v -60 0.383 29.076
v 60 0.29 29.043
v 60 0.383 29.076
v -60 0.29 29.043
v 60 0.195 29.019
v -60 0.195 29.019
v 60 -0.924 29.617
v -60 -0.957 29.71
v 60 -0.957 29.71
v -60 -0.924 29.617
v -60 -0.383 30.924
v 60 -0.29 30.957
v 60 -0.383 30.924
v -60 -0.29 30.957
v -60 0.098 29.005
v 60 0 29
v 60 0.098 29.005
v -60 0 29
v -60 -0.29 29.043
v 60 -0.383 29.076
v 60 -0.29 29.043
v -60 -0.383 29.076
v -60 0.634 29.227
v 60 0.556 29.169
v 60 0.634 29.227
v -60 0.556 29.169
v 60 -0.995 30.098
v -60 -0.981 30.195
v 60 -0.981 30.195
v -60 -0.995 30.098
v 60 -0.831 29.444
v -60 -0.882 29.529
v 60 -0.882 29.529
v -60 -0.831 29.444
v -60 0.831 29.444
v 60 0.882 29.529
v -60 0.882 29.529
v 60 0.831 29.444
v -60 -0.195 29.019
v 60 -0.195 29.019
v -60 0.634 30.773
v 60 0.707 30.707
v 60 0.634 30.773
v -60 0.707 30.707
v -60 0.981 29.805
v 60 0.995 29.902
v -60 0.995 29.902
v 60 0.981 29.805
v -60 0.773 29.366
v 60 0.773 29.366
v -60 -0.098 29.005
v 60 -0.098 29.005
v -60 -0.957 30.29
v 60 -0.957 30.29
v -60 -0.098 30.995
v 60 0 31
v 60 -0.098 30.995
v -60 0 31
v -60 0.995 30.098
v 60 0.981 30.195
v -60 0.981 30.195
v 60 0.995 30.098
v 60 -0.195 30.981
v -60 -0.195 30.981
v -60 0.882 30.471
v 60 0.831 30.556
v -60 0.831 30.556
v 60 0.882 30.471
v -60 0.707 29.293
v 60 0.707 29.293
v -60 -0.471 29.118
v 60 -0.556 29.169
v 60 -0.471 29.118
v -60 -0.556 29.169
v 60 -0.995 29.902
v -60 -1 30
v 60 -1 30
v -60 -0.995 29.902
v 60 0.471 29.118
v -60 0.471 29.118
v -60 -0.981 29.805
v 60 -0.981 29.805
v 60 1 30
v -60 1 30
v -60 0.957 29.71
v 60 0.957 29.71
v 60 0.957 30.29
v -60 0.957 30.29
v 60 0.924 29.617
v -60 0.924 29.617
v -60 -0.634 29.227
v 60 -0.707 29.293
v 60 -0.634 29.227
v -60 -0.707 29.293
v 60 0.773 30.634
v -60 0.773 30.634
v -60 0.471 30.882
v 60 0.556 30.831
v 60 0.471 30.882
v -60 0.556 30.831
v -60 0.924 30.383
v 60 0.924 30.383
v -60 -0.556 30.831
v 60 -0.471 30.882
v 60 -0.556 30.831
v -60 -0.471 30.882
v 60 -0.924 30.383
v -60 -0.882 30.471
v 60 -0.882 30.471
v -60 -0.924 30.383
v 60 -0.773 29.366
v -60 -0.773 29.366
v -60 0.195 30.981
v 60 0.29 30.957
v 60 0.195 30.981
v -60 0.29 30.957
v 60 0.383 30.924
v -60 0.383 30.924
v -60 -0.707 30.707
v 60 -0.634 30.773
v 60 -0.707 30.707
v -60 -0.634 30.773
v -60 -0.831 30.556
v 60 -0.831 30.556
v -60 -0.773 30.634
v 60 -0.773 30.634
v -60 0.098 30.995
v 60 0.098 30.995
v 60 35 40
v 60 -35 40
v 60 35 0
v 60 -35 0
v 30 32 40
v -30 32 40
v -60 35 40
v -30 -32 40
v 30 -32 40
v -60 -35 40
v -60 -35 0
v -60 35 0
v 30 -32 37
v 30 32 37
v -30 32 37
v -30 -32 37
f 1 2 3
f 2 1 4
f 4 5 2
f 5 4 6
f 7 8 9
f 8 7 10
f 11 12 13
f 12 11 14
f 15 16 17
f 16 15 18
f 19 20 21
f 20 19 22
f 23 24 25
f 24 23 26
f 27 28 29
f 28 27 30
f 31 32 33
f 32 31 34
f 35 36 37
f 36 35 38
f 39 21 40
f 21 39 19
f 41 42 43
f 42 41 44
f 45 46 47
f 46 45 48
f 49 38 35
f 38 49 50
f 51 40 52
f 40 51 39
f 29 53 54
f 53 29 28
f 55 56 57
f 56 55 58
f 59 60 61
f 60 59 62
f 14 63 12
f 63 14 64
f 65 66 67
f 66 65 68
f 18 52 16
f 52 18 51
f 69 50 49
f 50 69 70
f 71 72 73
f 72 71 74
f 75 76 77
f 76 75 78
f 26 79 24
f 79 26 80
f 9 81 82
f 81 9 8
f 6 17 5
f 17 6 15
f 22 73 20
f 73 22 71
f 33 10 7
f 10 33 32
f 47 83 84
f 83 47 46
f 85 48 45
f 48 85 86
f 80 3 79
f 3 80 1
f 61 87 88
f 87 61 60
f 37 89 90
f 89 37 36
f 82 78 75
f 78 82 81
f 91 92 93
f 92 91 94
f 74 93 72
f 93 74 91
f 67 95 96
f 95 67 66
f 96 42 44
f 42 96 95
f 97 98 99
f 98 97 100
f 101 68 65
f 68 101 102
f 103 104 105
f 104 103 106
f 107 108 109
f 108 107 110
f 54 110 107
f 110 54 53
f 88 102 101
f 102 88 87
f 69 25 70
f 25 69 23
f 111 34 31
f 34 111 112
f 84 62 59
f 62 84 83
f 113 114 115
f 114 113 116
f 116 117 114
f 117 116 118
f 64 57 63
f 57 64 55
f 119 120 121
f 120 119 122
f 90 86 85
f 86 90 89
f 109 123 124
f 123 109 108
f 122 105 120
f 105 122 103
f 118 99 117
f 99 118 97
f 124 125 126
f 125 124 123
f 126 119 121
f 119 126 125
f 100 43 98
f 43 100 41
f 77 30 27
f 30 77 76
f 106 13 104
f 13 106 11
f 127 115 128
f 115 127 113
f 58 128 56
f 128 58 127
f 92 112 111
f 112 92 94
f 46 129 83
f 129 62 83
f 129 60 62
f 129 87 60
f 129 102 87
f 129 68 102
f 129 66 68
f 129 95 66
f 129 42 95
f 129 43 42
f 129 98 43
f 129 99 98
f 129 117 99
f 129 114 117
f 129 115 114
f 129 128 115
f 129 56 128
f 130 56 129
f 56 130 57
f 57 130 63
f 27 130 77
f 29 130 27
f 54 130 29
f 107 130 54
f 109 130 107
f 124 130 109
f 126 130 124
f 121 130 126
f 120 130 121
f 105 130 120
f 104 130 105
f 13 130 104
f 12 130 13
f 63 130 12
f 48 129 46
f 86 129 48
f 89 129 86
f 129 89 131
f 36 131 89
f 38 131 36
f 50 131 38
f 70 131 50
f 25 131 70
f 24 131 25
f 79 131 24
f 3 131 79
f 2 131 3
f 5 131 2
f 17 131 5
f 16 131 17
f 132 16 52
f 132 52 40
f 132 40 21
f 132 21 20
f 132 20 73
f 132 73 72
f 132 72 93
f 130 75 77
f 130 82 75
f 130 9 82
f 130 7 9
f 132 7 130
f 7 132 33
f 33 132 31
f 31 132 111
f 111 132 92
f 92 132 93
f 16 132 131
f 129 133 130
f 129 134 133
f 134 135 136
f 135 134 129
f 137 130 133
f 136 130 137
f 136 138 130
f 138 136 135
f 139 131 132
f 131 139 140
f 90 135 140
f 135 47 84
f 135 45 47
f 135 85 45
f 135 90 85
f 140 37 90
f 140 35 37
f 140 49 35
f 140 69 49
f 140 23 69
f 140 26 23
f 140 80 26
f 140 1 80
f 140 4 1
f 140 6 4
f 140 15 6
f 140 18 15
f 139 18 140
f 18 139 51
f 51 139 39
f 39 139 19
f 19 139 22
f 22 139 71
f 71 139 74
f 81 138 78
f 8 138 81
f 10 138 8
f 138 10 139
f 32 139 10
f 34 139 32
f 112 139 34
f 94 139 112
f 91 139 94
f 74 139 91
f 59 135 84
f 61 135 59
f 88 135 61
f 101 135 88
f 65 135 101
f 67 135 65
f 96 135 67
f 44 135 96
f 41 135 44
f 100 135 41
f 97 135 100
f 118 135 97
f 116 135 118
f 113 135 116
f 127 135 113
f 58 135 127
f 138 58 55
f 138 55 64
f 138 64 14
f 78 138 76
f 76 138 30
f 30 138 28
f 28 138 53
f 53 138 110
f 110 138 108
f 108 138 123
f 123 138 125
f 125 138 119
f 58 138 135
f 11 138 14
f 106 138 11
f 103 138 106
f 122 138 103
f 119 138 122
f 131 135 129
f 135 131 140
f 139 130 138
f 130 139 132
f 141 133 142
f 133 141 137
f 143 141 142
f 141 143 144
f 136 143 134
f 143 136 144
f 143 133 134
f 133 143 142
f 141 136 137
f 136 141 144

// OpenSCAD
// Mini horizontal gel-electrophoresis box - buffer tank
// Print orientation: tank resting on its floor, open top facing up (+Z)

// ---------------- Parameters ----------------
tank_x      = 120;   // outer length along X (mm)
tank_y      = 70;    // outer width along Y (mm)
tank_z      = 40;    // outer height along Z (mm)

wall        = 3;     // wall thickness (mm)
floor       = 3;     // floor thickness (mm)

platform_x  = 60;    // platform length along X (mm), centred
platform_z  = 10;    // platform height above inner floor (mm) -> top at z = 13

hole_d      = 2;     // electrode hole diameter (mm)
hole_y      = 0;     // electrode hole Y position (mm)
hole_z      = 30;    // electrode hole Z position (mm)

eps         = 0.5;   // cutter overshoot past faces (mm)
$fn         = 64;    // curve resolution

// ---------------- Derived ----------------
inner_x = tank_x - 2 * wall;          // 114
inner_y = tank_y - 2 * wall;          // 64
inner_z = tank_z - floor;             // 37   // floor at z = 0, inner floor at z = 3

platform_top_z = inner_z + platform_z; // 47 (absolute top of platform)

// ---------------- Model ----------------
difference() {
    // Main tank body (open top)
    translate([-tank_x / 2, -tank_y / 2, 0])
        cube([tank_x, tank_y, tank_z]);

    // Central raised platform for gel tray
    // Spans full inner width (Y), centred in X, top at z = 13
    translate([-platform_x / 2, -inner_y / 2, inner_z])
        cube([platform_x, inner_y, platform_z]);

    // Horizontal electrode holes through each end wall, along X
    for (sx = [-1, 1])
        translate([sx > 0 ? tank_x / 2 - eps : -tank_x / 2 - eps, hole_y, hole_z])
            rotate([0, 90, 0])
                cylinder(d = hole_d, h = tank_x + 2 * eps);
}
